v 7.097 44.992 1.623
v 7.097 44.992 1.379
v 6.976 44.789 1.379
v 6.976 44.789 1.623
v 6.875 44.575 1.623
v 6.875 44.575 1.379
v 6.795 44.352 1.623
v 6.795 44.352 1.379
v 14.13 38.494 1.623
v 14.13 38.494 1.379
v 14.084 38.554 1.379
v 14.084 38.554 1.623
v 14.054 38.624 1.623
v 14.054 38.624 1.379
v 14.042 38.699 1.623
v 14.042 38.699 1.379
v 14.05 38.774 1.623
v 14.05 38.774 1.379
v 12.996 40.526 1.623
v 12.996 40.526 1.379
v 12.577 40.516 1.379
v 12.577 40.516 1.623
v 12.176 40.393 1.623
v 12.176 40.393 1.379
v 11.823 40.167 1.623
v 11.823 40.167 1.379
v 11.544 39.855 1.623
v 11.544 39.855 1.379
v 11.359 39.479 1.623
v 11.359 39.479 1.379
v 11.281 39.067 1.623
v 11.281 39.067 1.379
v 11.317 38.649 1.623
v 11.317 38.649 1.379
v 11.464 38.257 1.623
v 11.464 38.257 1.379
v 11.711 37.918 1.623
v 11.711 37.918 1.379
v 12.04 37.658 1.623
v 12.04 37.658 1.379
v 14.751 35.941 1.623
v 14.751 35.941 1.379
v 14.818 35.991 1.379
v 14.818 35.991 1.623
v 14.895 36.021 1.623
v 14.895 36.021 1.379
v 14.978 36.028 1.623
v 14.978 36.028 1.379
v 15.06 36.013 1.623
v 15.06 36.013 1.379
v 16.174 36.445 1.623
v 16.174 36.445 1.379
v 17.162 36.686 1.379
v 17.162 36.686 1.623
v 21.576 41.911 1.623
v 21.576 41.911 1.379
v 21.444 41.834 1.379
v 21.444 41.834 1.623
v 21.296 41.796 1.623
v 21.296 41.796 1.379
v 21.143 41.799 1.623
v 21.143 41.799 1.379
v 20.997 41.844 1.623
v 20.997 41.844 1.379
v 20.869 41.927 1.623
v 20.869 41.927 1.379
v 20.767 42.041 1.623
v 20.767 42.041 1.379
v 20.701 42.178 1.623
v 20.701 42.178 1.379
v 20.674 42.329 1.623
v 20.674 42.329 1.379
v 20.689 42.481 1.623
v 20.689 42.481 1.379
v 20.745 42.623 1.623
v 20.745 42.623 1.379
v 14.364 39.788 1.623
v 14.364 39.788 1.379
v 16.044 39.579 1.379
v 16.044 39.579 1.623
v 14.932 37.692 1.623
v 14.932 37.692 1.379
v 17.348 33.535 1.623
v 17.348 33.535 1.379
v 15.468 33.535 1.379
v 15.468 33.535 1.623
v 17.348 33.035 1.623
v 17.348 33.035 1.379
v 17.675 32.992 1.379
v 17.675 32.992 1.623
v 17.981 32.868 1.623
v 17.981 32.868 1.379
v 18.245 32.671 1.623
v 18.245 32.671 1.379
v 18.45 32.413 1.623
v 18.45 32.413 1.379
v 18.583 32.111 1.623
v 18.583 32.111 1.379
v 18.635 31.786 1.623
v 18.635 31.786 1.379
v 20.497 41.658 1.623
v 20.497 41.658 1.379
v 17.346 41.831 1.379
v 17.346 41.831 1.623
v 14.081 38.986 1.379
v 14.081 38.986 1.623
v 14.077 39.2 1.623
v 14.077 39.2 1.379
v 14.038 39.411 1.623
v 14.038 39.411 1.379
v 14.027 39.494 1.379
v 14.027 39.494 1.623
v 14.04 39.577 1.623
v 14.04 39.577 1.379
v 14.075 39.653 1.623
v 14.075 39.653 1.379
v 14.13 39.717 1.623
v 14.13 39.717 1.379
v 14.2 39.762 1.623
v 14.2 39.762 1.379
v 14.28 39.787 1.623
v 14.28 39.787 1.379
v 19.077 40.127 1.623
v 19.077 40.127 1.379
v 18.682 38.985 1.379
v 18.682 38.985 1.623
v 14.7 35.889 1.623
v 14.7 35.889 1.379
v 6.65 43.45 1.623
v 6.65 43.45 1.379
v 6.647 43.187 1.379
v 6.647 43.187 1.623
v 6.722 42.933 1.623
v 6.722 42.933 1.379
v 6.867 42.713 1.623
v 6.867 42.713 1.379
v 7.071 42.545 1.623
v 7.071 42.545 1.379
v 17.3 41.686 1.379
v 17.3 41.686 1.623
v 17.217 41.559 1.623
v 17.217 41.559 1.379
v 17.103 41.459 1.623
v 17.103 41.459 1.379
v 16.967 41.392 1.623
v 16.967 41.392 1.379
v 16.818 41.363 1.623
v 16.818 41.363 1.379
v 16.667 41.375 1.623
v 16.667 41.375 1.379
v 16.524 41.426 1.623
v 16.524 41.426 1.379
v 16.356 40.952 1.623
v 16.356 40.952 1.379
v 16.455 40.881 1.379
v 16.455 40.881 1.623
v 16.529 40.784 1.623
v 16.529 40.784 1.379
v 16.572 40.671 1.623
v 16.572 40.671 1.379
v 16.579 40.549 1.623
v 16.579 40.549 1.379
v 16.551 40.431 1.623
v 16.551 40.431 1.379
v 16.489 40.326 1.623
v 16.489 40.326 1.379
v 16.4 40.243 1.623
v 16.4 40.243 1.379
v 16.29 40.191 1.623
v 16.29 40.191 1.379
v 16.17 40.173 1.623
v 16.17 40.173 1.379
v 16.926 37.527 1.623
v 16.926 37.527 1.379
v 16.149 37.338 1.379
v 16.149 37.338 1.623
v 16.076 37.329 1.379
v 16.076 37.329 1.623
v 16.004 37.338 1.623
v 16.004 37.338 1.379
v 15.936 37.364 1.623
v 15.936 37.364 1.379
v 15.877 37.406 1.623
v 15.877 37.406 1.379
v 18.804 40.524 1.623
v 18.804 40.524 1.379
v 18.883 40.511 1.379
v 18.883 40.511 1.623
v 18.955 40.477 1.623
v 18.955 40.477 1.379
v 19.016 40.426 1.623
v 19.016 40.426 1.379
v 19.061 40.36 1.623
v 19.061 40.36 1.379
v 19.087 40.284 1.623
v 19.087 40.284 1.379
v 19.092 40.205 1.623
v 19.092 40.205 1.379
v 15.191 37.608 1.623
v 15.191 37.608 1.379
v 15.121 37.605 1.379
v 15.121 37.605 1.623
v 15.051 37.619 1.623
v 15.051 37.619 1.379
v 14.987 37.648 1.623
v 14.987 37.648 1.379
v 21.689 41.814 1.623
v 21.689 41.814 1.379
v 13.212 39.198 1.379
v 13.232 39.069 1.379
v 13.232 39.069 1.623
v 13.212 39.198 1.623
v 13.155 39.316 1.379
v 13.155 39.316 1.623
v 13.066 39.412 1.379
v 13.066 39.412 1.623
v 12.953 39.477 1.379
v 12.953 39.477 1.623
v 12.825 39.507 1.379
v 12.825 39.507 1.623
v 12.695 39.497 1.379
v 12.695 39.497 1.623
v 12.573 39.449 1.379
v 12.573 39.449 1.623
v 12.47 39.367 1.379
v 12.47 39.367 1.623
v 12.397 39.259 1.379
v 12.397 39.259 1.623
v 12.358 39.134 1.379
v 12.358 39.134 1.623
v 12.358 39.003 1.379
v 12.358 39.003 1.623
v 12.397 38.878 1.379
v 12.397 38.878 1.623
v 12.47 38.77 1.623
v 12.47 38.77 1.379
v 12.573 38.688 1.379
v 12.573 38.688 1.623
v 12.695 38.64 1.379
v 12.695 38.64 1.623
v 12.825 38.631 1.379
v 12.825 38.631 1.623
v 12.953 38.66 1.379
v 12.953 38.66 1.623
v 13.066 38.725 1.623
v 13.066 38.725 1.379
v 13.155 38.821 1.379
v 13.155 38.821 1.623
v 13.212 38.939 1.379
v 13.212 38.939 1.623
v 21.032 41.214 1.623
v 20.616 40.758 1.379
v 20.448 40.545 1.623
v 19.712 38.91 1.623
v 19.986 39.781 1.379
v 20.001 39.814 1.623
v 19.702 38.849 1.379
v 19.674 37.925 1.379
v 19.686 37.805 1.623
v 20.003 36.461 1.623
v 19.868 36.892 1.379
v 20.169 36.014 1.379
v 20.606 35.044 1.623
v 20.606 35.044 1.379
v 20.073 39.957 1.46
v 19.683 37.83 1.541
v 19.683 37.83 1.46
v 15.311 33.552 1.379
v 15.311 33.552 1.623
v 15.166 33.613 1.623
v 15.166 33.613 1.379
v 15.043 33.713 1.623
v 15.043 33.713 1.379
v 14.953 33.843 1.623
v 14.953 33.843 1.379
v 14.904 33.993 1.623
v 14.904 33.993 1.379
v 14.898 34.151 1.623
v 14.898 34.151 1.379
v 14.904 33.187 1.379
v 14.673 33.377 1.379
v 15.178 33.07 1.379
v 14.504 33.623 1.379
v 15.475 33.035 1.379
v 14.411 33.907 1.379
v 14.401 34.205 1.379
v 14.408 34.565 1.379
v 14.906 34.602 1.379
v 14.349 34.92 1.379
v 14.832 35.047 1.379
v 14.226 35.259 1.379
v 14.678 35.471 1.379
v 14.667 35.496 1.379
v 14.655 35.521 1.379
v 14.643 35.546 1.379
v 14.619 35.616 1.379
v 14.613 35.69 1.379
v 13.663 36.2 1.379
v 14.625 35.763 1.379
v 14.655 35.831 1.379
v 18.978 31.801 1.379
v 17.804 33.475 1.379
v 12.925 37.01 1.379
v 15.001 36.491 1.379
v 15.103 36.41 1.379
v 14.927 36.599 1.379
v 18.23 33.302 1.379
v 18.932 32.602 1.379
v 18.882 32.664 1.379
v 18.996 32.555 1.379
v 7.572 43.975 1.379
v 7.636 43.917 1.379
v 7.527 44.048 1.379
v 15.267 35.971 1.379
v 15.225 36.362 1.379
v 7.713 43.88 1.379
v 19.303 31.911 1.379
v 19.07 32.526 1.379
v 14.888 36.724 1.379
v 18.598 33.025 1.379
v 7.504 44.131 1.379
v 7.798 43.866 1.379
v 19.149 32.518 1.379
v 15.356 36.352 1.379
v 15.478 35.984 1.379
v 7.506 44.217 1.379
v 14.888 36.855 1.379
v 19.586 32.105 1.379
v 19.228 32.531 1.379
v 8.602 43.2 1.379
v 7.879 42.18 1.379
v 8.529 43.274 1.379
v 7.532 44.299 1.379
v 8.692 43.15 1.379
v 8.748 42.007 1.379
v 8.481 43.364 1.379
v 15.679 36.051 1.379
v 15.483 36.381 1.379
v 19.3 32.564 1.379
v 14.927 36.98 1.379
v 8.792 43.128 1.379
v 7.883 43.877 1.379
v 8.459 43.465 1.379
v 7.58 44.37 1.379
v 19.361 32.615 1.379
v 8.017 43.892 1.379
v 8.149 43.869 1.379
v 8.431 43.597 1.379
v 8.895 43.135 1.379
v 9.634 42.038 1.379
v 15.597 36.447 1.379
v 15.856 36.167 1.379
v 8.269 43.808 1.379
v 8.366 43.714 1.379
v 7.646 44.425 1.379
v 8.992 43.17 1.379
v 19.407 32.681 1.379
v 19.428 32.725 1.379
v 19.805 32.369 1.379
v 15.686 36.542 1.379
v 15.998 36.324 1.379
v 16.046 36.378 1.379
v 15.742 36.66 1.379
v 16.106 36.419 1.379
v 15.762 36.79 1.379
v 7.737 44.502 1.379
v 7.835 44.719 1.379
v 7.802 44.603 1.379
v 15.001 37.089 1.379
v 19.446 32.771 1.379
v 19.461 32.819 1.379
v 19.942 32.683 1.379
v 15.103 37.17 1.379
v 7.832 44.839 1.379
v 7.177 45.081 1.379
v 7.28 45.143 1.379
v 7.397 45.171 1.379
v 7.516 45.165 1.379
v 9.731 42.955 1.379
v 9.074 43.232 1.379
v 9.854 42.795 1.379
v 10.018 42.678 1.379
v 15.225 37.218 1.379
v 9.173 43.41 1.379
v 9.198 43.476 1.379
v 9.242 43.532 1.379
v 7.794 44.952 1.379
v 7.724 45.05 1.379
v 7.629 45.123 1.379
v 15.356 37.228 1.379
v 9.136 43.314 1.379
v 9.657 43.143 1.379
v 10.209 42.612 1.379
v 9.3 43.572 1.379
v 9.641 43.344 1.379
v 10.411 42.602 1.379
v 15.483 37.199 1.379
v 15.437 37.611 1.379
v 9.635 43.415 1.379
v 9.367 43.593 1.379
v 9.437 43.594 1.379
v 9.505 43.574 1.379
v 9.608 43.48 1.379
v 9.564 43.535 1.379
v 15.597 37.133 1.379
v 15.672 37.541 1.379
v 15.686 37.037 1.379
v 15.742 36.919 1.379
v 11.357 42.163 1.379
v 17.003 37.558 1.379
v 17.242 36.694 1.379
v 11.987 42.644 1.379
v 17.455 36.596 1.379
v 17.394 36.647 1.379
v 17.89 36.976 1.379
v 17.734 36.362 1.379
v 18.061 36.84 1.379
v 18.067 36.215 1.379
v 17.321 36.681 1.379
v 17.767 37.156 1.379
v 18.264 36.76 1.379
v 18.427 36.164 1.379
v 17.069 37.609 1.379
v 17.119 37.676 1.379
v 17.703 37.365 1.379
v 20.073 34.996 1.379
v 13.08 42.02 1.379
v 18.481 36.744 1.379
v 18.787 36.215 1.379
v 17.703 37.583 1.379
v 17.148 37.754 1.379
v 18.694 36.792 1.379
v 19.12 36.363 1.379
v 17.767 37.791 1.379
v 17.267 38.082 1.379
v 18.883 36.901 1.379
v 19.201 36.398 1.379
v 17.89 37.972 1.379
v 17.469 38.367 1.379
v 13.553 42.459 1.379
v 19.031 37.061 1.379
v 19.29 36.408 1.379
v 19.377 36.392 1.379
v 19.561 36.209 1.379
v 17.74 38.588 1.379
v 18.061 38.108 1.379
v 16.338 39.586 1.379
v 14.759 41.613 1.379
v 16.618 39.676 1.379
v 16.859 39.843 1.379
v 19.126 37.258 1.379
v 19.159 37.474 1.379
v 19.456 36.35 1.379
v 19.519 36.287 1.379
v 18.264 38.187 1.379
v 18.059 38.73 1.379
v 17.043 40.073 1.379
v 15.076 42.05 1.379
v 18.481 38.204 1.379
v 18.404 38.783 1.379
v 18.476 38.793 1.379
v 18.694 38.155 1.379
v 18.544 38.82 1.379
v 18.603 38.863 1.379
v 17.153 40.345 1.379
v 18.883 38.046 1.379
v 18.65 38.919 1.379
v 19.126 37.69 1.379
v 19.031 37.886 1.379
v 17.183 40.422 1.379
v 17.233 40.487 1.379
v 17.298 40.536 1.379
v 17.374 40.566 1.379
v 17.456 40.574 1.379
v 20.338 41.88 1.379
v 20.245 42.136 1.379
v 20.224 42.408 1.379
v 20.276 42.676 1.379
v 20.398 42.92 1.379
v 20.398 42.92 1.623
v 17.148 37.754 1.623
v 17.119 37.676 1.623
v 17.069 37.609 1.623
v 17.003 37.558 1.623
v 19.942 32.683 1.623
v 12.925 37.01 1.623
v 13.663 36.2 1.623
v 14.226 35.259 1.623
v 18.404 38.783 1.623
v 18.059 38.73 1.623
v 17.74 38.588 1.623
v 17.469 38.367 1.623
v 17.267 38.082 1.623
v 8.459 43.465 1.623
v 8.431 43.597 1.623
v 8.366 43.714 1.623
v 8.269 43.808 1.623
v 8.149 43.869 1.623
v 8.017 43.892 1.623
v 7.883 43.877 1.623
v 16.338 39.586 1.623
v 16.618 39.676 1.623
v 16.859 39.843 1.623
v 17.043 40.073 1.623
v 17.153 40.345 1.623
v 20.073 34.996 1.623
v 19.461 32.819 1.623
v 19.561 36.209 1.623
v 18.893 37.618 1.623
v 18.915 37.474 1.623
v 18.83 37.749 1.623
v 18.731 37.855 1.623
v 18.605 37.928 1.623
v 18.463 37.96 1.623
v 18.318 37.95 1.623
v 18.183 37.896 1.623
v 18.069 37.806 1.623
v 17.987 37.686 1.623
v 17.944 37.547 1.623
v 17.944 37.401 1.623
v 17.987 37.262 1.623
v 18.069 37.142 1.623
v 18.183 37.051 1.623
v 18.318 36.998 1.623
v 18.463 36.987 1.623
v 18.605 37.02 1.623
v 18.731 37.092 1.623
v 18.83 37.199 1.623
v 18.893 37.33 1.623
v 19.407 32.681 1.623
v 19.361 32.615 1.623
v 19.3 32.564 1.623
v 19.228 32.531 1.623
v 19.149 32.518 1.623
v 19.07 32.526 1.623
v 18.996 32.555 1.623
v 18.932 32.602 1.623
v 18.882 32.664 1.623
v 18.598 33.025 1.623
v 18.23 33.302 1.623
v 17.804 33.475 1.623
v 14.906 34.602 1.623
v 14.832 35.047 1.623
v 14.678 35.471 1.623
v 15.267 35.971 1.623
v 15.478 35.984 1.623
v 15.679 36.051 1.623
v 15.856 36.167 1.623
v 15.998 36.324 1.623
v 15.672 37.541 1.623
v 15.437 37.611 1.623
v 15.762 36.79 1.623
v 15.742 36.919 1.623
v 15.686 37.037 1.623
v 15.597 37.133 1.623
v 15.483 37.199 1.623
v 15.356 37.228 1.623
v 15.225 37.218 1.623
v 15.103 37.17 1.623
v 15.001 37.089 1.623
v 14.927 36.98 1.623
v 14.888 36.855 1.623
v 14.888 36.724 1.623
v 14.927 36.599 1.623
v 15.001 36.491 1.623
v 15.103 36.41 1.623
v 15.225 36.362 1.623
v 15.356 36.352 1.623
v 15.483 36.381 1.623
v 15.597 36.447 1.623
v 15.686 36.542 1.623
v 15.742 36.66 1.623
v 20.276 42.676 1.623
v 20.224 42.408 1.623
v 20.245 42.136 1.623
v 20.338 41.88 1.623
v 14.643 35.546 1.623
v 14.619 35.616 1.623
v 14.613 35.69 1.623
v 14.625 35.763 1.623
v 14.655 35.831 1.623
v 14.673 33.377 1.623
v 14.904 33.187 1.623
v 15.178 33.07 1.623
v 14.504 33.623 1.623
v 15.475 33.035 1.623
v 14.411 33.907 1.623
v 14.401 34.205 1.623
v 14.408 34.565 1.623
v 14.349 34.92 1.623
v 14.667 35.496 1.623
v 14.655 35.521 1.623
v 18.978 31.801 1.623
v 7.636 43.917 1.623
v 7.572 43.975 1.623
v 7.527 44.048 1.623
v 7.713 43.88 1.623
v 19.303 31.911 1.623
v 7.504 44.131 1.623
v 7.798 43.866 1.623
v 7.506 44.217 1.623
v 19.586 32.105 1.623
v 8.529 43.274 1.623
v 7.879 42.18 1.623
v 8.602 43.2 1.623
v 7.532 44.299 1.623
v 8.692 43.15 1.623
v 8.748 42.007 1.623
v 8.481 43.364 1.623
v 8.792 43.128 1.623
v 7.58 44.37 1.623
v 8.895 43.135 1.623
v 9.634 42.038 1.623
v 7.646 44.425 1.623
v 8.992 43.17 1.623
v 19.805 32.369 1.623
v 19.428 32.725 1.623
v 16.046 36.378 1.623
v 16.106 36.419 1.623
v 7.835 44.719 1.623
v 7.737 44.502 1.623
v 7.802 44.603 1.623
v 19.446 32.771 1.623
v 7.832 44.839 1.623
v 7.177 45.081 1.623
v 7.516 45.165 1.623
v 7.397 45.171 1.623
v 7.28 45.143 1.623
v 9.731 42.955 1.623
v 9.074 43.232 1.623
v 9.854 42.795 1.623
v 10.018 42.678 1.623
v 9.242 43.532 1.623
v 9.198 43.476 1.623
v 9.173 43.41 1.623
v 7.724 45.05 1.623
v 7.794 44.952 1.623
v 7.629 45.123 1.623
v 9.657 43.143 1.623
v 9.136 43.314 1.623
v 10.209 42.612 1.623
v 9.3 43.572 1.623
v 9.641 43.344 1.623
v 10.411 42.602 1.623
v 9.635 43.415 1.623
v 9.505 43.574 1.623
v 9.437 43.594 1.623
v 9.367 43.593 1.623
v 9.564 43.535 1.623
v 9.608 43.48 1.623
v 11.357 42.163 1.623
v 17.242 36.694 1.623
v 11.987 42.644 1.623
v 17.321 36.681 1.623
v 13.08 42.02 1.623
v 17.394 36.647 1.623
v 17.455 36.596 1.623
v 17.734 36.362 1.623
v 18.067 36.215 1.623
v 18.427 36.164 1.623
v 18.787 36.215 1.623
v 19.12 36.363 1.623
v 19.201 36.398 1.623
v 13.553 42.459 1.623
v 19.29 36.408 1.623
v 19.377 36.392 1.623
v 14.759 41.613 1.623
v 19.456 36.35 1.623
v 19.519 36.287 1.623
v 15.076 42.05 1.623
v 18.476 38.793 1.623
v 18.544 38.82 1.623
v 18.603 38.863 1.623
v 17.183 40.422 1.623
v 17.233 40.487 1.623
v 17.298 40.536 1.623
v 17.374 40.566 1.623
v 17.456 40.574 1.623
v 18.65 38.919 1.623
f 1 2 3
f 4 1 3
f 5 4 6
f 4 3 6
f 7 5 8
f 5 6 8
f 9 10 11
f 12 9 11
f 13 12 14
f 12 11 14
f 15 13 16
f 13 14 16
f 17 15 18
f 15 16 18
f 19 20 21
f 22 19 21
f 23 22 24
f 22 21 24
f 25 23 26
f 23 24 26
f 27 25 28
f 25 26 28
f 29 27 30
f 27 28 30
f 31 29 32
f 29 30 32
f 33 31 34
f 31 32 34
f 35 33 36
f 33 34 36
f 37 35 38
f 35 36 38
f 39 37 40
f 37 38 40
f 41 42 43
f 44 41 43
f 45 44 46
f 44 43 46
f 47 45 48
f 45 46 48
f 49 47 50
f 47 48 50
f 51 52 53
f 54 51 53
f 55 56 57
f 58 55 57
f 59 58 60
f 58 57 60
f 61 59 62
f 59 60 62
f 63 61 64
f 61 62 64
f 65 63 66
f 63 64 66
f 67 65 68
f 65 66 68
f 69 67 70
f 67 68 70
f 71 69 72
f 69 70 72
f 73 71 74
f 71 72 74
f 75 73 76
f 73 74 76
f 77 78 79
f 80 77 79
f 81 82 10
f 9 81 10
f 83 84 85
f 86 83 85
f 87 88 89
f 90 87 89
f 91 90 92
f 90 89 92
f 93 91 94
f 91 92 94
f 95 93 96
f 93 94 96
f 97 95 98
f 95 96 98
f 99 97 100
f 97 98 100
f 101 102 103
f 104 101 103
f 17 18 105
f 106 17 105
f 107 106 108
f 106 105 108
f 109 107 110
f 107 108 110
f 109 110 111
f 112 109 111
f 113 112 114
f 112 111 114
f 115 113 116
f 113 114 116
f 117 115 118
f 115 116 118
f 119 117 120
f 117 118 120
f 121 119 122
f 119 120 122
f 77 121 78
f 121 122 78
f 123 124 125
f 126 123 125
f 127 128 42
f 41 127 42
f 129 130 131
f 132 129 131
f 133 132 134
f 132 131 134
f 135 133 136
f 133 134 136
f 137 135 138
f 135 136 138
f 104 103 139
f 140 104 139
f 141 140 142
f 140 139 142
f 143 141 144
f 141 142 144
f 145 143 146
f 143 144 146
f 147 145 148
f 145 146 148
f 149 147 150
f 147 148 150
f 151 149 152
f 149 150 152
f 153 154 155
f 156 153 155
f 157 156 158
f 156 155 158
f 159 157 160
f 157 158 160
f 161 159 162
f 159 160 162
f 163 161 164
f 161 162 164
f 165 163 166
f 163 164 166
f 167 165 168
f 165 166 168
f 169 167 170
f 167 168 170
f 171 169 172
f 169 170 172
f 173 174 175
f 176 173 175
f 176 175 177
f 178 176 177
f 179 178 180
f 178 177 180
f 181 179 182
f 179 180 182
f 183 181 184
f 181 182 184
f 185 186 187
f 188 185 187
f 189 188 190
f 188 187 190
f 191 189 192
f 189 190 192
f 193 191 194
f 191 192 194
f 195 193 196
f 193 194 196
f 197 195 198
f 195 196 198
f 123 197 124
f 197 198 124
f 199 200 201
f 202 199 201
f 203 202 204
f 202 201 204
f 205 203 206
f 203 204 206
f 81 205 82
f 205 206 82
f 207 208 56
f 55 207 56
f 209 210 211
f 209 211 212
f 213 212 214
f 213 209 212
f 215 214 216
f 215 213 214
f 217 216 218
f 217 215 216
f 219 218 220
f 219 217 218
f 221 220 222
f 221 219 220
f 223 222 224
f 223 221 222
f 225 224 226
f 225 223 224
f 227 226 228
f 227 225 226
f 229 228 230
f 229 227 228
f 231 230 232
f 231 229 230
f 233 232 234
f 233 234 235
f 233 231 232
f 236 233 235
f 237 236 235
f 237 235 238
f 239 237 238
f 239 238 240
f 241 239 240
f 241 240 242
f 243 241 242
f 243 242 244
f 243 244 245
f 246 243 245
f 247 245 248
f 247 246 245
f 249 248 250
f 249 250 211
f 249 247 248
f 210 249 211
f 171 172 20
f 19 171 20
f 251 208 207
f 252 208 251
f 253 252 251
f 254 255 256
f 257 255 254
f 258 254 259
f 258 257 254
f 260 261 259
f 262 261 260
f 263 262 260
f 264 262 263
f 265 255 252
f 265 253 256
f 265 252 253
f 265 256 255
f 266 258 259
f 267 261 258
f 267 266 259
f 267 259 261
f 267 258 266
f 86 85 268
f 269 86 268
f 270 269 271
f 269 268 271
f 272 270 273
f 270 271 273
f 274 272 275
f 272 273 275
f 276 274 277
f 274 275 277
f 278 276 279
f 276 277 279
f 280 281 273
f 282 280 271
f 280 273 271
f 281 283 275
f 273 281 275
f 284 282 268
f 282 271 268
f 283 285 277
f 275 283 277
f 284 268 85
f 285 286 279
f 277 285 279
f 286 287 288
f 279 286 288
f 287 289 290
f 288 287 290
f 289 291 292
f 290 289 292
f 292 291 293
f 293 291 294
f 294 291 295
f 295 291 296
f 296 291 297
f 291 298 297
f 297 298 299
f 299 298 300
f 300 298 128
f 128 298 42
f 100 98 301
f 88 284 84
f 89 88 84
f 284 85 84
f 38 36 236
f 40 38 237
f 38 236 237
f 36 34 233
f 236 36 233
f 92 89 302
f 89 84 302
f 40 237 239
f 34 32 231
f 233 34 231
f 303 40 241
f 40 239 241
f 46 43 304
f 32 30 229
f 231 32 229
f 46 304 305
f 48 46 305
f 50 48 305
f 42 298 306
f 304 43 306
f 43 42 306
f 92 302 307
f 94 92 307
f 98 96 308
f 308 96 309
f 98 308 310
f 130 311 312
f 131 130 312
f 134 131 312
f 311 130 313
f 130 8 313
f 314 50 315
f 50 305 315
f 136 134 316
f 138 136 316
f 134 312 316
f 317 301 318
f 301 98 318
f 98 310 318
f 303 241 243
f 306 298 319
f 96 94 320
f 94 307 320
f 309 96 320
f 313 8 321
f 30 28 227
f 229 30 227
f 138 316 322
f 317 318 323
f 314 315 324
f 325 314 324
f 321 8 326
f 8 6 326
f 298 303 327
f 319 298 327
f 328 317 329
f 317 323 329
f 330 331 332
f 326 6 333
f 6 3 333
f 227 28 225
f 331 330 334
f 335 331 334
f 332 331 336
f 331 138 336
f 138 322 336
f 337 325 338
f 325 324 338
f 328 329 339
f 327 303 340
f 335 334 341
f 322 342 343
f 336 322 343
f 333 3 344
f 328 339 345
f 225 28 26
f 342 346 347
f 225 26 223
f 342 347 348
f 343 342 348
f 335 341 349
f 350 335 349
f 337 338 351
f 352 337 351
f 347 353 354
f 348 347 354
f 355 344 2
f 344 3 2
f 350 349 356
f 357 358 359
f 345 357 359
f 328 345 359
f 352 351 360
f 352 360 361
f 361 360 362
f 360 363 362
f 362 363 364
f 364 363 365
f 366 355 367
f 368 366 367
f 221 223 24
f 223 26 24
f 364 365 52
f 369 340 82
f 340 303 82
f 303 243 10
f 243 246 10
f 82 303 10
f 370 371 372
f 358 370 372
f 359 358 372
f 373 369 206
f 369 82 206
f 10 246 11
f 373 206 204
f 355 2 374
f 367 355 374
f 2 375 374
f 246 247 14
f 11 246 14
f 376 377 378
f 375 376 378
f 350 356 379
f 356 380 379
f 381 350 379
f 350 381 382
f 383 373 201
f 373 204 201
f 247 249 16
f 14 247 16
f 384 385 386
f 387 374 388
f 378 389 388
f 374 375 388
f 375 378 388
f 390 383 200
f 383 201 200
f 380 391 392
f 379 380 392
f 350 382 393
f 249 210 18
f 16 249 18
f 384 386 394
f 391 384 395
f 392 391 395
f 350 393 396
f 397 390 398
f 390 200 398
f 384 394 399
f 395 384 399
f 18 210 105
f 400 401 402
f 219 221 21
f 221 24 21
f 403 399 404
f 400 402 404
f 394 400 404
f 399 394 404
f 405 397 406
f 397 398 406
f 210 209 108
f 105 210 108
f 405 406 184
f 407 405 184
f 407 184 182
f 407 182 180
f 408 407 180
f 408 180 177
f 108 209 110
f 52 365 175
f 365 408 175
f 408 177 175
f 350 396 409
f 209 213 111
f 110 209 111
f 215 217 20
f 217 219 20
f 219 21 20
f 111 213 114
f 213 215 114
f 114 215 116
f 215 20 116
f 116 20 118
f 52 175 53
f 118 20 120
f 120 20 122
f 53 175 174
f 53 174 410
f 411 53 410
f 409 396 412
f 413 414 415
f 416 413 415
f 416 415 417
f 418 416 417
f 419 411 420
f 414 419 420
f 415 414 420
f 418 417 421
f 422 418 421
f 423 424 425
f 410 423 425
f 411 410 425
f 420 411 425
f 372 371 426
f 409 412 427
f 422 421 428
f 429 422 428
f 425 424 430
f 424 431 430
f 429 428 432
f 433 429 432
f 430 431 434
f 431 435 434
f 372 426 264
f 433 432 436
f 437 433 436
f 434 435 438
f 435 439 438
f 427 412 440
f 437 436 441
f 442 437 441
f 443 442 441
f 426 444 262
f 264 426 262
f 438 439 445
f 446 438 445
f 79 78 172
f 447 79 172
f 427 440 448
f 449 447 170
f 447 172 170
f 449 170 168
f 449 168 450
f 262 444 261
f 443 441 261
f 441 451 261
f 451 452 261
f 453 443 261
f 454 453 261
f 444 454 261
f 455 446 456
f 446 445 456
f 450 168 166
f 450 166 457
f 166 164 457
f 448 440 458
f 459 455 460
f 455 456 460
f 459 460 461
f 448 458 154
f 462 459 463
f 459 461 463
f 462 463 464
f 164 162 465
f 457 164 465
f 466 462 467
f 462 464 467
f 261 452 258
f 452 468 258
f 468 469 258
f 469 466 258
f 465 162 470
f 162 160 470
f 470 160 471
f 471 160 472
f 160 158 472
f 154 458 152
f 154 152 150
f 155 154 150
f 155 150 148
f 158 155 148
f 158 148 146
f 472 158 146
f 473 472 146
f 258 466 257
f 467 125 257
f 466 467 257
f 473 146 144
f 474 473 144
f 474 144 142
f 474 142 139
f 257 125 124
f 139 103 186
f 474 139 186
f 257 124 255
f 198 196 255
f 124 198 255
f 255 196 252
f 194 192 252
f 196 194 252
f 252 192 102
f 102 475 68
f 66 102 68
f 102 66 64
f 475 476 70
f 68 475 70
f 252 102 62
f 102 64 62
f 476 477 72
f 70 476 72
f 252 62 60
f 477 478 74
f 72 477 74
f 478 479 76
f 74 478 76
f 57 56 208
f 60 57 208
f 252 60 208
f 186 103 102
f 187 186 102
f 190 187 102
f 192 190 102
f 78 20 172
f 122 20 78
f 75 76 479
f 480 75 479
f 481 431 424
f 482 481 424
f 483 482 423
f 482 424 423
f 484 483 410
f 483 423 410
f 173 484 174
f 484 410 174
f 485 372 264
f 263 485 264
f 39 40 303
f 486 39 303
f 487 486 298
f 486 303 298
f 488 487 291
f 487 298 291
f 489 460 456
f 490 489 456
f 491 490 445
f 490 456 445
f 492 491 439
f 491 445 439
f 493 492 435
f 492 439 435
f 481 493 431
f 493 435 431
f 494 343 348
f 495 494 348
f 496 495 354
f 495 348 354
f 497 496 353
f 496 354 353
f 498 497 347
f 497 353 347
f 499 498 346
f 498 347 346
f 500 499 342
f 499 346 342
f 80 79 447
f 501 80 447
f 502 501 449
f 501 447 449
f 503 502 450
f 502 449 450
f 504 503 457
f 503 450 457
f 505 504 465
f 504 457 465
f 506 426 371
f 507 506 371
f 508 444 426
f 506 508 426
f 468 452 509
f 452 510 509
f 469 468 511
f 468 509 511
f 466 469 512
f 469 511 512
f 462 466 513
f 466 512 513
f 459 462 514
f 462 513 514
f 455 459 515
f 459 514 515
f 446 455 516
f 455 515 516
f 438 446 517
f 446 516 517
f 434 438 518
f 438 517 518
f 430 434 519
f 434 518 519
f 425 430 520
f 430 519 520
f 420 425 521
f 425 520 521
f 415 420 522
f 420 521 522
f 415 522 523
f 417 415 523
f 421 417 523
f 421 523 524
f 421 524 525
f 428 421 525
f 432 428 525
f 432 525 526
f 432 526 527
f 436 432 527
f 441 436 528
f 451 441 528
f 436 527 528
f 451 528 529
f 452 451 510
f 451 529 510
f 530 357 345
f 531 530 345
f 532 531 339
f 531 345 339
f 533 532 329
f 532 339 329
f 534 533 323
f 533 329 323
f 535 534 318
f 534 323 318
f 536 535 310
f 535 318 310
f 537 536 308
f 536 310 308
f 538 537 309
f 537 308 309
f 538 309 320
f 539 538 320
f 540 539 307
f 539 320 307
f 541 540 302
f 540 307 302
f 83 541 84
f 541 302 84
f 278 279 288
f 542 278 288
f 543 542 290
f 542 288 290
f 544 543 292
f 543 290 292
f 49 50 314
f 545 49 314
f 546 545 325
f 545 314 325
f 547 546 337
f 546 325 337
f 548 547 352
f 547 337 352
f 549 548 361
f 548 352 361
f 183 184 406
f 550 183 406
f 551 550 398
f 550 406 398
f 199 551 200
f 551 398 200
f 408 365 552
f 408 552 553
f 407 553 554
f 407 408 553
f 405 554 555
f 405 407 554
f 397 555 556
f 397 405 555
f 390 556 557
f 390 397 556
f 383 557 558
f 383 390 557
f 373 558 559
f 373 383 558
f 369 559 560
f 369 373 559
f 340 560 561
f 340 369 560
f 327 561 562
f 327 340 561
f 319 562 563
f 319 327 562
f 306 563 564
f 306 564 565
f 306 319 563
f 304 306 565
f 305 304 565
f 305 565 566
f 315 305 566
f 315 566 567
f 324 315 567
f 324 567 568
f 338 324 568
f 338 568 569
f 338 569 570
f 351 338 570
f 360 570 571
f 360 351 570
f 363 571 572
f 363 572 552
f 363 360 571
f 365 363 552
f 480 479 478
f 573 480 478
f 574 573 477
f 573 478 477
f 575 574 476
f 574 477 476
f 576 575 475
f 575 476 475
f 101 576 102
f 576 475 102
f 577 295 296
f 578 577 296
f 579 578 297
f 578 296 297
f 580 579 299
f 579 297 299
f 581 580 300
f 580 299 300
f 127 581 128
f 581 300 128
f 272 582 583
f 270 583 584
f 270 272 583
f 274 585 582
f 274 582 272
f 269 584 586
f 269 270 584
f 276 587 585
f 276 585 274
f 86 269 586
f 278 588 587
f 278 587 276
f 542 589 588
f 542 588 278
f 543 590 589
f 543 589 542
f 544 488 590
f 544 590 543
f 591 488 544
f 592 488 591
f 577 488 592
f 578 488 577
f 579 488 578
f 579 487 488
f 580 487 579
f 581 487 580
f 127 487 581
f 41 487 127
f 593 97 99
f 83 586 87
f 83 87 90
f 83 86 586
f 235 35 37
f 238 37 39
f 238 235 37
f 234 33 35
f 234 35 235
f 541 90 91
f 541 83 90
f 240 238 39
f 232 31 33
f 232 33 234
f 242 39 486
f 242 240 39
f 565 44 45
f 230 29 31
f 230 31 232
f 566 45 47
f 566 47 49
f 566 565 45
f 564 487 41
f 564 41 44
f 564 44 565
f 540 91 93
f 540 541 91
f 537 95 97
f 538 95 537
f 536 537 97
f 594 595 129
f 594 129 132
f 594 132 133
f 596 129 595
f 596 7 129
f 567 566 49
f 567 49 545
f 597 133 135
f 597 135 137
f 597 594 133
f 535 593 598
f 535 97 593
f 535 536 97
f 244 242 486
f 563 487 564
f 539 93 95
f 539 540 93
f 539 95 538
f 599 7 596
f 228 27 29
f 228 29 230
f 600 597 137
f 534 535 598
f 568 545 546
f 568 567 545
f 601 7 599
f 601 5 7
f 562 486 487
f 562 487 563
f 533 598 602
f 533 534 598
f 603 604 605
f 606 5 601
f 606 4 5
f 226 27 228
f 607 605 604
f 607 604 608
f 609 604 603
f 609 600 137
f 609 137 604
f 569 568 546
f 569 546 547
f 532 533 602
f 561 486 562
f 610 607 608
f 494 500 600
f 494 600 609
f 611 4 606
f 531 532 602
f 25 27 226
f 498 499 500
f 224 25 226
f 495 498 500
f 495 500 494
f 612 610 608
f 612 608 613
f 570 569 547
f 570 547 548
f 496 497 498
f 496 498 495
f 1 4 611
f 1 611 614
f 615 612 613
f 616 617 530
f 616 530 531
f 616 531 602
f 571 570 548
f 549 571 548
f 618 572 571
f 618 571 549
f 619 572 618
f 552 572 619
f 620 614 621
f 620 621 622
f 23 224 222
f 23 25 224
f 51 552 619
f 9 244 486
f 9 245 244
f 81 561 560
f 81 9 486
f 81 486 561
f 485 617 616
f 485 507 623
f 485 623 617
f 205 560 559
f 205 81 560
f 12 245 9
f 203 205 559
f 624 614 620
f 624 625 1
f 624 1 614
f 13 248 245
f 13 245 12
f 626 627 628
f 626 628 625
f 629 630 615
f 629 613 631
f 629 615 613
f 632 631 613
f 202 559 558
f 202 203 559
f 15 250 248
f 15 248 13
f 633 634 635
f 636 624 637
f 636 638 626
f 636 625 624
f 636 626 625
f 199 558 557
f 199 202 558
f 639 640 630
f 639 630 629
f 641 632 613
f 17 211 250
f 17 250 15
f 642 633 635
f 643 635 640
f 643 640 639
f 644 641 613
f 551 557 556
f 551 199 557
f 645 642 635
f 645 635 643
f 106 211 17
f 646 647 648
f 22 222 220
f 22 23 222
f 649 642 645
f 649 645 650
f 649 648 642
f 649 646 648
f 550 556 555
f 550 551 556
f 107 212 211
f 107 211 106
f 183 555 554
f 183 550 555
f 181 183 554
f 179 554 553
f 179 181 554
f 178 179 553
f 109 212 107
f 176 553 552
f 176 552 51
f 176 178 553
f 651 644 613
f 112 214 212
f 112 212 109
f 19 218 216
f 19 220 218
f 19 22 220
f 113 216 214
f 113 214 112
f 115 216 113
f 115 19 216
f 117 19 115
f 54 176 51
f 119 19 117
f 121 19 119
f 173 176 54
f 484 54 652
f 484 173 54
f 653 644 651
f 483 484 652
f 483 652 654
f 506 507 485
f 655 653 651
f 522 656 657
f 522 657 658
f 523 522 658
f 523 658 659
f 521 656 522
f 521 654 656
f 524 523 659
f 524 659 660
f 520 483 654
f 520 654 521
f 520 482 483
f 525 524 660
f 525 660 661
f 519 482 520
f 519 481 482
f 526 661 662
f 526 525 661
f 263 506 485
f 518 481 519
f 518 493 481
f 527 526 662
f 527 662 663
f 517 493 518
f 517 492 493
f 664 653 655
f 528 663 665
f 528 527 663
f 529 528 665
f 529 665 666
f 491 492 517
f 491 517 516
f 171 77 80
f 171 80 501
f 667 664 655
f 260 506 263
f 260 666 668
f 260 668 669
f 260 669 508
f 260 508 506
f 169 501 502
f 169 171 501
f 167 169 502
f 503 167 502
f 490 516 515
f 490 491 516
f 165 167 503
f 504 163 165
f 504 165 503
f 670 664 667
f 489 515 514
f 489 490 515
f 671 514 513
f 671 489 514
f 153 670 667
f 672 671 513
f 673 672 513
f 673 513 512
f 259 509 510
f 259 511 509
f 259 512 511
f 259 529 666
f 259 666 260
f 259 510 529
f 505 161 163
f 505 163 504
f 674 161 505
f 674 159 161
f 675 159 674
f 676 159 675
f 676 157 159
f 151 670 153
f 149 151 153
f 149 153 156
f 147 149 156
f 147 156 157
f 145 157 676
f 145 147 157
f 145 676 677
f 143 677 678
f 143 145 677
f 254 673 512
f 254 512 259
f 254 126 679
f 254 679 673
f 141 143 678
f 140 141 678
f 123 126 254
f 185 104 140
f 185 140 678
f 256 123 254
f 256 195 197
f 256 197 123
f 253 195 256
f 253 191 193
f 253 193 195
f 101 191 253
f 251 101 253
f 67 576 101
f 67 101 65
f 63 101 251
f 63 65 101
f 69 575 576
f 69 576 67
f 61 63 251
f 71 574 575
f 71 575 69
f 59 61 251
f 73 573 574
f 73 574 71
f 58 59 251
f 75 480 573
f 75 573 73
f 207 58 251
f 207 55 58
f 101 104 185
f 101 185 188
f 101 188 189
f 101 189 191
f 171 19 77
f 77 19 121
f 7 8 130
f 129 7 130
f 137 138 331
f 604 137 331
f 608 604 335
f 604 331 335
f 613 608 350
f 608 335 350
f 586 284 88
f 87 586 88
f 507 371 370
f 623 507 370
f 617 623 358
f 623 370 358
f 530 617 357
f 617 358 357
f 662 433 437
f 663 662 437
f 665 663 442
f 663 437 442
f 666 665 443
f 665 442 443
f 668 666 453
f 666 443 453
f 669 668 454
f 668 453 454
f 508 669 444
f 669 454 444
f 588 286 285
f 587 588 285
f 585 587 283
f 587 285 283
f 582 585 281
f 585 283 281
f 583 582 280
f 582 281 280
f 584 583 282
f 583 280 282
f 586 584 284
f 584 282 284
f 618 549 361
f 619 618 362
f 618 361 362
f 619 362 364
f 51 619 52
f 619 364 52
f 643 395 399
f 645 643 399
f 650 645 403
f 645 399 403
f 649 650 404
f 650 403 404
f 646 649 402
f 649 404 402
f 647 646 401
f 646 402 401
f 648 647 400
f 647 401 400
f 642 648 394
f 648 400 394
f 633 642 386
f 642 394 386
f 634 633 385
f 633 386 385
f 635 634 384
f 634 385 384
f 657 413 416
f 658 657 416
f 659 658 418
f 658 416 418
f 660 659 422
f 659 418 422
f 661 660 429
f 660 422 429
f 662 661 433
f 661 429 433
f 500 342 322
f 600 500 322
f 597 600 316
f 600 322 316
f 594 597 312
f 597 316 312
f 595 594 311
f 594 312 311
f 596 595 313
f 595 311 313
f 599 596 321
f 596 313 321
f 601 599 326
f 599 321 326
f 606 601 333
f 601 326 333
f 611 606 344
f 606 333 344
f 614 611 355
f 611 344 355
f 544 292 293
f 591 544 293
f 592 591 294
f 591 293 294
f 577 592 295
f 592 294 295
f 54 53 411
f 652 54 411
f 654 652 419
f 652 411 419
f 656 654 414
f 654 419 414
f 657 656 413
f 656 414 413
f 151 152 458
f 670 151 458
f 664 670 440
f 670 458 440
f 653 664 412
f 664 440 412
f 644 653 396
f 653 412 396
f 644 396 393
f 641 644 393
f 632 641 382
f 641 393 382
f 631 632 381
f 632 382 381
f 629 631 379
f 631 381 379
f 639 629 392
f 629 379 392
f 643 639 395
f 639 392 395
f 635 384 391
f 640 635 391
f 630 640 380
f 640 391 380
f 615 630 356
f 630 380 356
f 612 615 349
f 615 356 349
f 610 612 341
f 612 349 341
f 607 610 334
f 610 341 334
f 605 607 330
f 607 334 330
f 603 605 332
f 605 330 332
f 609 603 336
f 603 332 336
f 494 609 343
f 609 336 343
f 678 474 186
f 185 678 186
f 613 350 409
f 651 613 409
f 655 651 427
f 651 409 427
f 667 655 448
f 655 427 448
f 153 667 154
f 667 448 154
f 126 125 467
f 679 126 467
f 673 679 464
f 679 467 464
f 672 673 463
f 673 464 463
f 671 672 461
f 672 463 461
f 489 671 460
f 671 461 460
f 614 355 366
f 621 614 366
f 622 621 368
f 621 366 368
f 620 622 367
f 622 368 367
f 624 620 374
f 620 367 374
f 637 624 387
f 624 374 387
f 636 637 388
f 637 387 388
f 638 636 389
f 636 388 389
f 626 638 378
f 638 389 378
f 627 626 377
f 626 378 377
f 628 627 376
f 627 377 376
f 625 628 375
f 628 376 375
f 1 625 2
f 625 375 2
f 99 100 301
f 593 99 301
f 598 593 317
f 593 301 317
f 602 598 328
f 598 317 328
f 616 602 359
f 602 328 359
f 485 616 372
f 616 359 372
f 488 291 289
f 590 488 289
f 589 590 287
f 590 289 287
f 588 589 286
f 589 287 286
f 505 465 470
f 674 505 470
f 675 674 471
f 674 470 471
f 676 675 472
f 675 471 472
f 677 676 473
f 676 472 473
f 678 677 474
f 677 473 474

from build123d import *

# Parameters (mm, degrees)
SCALE1_START       = 1.378692074
SCALE1_OUTLINE_R   = 0.4392
SCALE1_DEPTH       = 0.244
CUT_EXTRUDE1_DEPTH = 2.54
CUT_EXTRUDE2_DEPTH = 51.110559093
CUT_EXTRUDE3_DEPTH = 51.110559093
CUT_EXTRUDE4_DEPTH = 51.110559093


with BuildPart() as part:
    # Scale1: read off the stored shape, not the designer's step
    # Scale1 outline → Scale1 (new body)
    with BuildSketch(Plane.XY.offset(SCALE1_START)):
        with BuildLine():
            Line((17.68301566, 43.704577473), (17.346177673, 41.830755017))
            ThreePointArc((17.346177673, 41.830755017), (17.037161165, 41.420736581), (16.523766226, 41.426389643))
            ThreePointArc((16.523766226, 41.426389643), (13.552700425, 42.459086685), (10.410542545, 42.602401154))
            ThreePointArc((10.410542545, 42.602401154), (9.854263516, 42.795493333), (9.640942513, 43.344333108))
            ThreePointArc((9.640942513, 43.344333108), (9.437328912, 43.59391361), (9.172716599, 43.410258363))
            ThreePointArc((9.172716599, 43.410258363), (8.792265037, 43.128007225), (8.459444481, 43.465111917))
            ThreePointArc((8.459444481, 43.465111917), (8.269075619, 43.807602921), (7.883340454, 43.876514268))
            ThreePointArc((7.883340454, 43.876514268), (7.526718951, 44.047734987), (7.645582772, 44.425050271))
            ThreePointArc((7.645582772, 44.425050271), (7.724200076, 45.050111764), (7.096911805, 44.991871103))
            ThreePointArc((7.096911805, 44.991871103), (6.923054486, 44.682724324), (6.79514349, 44.351911876))
            Line((6.79514349, 44.351911876), (6.650098626, 43.450480425))
            ThreePointArc((6.650098626, 43.450480425), (6.721898103, 42.933324679), (7.071222107, 42.545280904))
            ThreePointArc((7.071222107, 42.545280904), (8.30836308, 42.068484056), (9.633857836, 42.038207468))
            ThreePointArc((9.633857836, 42.038207468), (13.079663737, 42.019930147), (16.355693709, 40.951501394))
            ThreePointArc((16.355693709, 40.951501394), (16.569606698, 40.488798349), (16.169670974, 40.172721944))
            Line((16.169670974, 40.172721944), (12.996206362, 40.526319917))
            ThreePointArc((12.996206362, 40.526319917), (11.358592721, 39.478912268), (12.040129402, 37.658376915))
            ThreePointArc((12.040129402, 37.658376915), (13.31395276, 36.623381651), (14.225764982, 35.258669367))
            ThreePointArc((14.225764982, 35.258669367), (14.386229966, 34.744015637), (14.401396414, 34.205139535))
            ThreePointArc((14.401396414, 34.205139535), (14.672806749, 33.376647317), (15.474699865, 33.034550319))
            Line((15.474699865, 33.034550319), (17.348101609, 33.034550317))
            ThreePointArc((17.348101609, 33.034550317), (18.244587572, 32.671085647), (18.634843629, 31.785933762))
            ThreePointArc((18.634843629, 31.785933762), (19.451177789, 31.997778319), (19.942322167, 32.683385187))
            Line((19.942322167, 32.683385187), (21.269314636, 37.404760613))
            ThreePointArc((21.269314636, 37.404760613), (21.73439895, 38.387008616), (22.497682404, 39.16064479))
            Line((22.497682404, 39.16064479), (23.128103851, 39.765569271))
            ThreePointArc((23.128103851, 39.765569271), (23.52490002, 40.486669007), (23.253920075, 41.263844598))
            Line((23.253920075, 41.263844598), (22.452558823, 42.115876451))
            ThreePointArc((22.452558823, 42.115876451), (22.115289154, 42.23834678), (21.816559174, 42.039575025))
            Line((21.816559174, 42.039575025), (21.688661164, 41.814089241))
            Line((21.688661164, 41.814089241), (21.575749212, 41.910847183))
            ThreePointArc((21.575749212, 41.910847183), (20.868513286, 41.926668482), (20.744543825, 42.623134233))
            Line((20.744543825, 42.623134233), (18.940412338, 44.169153428))
            ThreePointArc((18.940412338, 44.169153428), (18.175234277, 44.306254238), (17.68301566, 43.704577473))
        make_face()
        with Locations((15.322718522, 36.789890957)):
            Circle(SCALE1_OUTLINE_R, mode=Mode.SUBTRACT)
        with Locations((12.792357561, 39.068616569)):
            Circle(SCALE1_OUTLINE_R, mode=Mode.SUBTRACT)
    extrude(amount=SCALE1_DEPTH)

    # Scale1 2 outline → Scale1 2 (revolve, cut)
    with BuildSketch(Plane(origin=(18.426504279, 37.473794578, 0), x_dir=(1, 0, 0), z_dir=(0, -1, 0))):
        Polygon((0, 1.378692074), (0.732, 1.378692074), (0.488, 1.622692074), (0, 1.622692074), align=None)
    revolve(axis=Axis((18.426504279, 37.473794578, 0), (0, 0, 1)), mode=Mode.SUBTRACT)

    # Sketch1 → Cut-Extrude1 (cut)
    with BuildSketch(Plane(origin=(0, 0, 1.378692074), x_dir=(-1, 0, 0), z_dir=(0, 0, -1))):
        with BuildLine():
            Line((-21.688661166, 41.81408924), (-21.982980789, 42.999564373))
            Line((-21.982980789, 42.999564373), (-25.421126936, 39.405059446))
            Line((-25.421126936, 39.405059446), (-20.605818398, 35.044072901))
            add(Edge.make_bspline(
                [(-21.688661166, 41.81408924), (-19.489266143, 39.961862231), (-18.997440369, 38.289314262), (-20.605818398, 35.044072901)],
                knots=[0, 0, 0, 0, 1, 1, 1, 1], degree=3))
        make_face()
    extrude(amount=-CUT_EXTRUDE1_DEPTH, mode=Mode.SUBTRACT)

    # Sketch2 → Cut-Extrude2 (cut, through all)
    with BuildSketch(Plane(origin=(0, 0, 1.378692074), x_dir=(-1, 0, 0), z_dir=(0, 0, -1))):
        with BuildLine():
            Line((-17.348101609, 33.534550318), (-15.46825055, 33.534550318))
            ThreePointArc((-15.46825055, 33.534550318), (-15.042927497, 33.712833322), (-14.89843377, 34.150790045))
            ThreePointArc((-14.89843377, 34.150790045), (-14.879423654, 34.826234772), (-14.678291655, 35.471318396))
            ThreePointArc((-14.678291655, 35.471318396), (-14.660582055, 35.508670476), (-14.642615597, 35.545899689))
            ThreePointArc((-14.642615597, 35.545899689), (-14.616480362, 35.726837837), (-14.700216201, 35.889349293))
            Line((-14.700216201, 35.889349293), (-14.751462797, 35.940595889))
            ThreePointArc((-14.751462797, 35.940595889), (-14.895326012, 36.020592881), (-15.059742801, 36.012639096))
            ThreePointArc((-15.059742801, 36.012639096), (-15.580994431, 36.011064763), (-15.998016925, 36.323791449))
            ThreePointArc((-15.998016925, 36.323791449), (-16.074795707, 36.400479379), (-16.173833875, 36.44483545))
            Line((-16.173833875, 36.44483545), (-17.161803556, 36.685788167))
            ThreePointArc((-17.161803556, 36.685788167), (-17.321020312, 36.681092865), (-17.455391032, 36.595556142))
            ThreePointArc((-17.455391032, 36.595556142), (-18.245306435, 36.177055965), (-19.119682785, 36.362998806))
            ThreePointArc((-19.119682785, 36.362998806), (-19.377471249, 36.391695847), (-19.561279678, 36.208685263))
            Line((-19.561279678, 36.208685263), (-20.072904791, 34.995897621))
            Line((-20.072904791, 34.995897621), (-19.460972938, 32.818673477))
            ThreePointArc((-19.460972938, 32.818673477), (-19.437288786, 32.748237282), (-19.40663946, 32.680540786))
            ThreePointArc((-19.40663946, 32.680540786), (-19.149382906, 32.518029269), (-18.882393628, 32.66400068))
            ThreePointArc((-18.882393628, 32.66400068), (-18.230131749, 33.301751954), (-17.348101609, 33.534550318))
        make_face()
    extrude(amount=-CUT_EXTRUDE2_DEPTH, mode=Mode.SUBTRACT)

    # Sketch3 → Cut-Extrude3 (cut, through all)
    with BuildSketch(Plane(origin=(0, 0, 1.378692074), x_dir=(-1, 0, 0), z_dir=(0, 0, -1))):
        with BuildLine():
            Line((-20.496817758, 41.658030449), (-17.346177676, 41.830755017))
            Line((-17.346177676, 41.830755017), (-17.346177676, 45.415633963))
            Line((-17.346177676, 45.415633963), (-20.923893138, 43.312384261))
            ThreePointArc((-20.923893138, 43.312384261), (-20.253979171, 42.603021979), (-20.496817758, 41.658030449))
        make_face()
    extrude(amount=-CUT_EXTRUDE3_DEPTH, mode=Mode.SUBTRACT)

    # Sketch4 → Cut-Extrude4 (cut, through all)
    with BuildSketch(Plane(origin=(0, 0, 1.378692074), x_dir=(-1, 0, 0), z_dir=(0, 0, -1))):
        with BuildLine():
            Line((-17.455852383, 40.574313146), (-18.8042073, 40.524397539))
            ThreePointArc((-18.8042073, 40.524397539), (-19.040601602, 40.394153532), (-19.076676041, 40.126675679))
            Line((-19.076676041, 40.126675679), (-18.682397479, 38.984966524))
            ThreePointArc((-18.682397479, 38.984966524), (-18.575024983, 38.840086232), (-18.403989188, 38.782938099))
            ThreePointArc((-18.403989188, 38.782938099), (-17.597035683, 38.48688171), (-17.14755053, 37.754224599))
            ThreePointArc((-17.14755053, 37.754224599), (-17.069108072, 37.608838613), (-16.925594615, 37.527020573))
            Line((-16.925594615, 37.527020573), (-16.148609211, 37.337524127))
            ThreePointArc((-16.148609211, 37.337524127), (-16.00427201, 37.33806247), (-15.876892057, 37.405943726))
            ThreePointArc((-15.876892057, 37.405943726), (-15.557022892, 37.584705893), (-15.191334883, 37.60803988))
            ThreePointArc((-15.191334883, 37.60803988), (-15.051369663, 37.618828593), (-14.931636329, 37.692112887))
            Line((-14.931636329, 37.692112887), (-14.130011628, 38.493737588))
            ThreePointArc((-14.130011628, 38.493737588), (-14.053640182, 38.623615493), (-14.050038507, 38.774240511))
            ThreePointArc((-14.050038507, 38.774240511), (-14.083791972, 39.093431642), (-14.037801355, 39.411090481))
            ThreePointArc((-14.037801355, 39.411090481), (-14.100156714, 39.686879536), (-14.364076124, 39.788340557))
            Line((-14.364076124, 39.788340557), (-16.044195491, 39.579464149))
            ThreePointArc((-16.044195491, 39.579464149), (-16.744622059, 39.75112655), (-17.15323559, 40.345349015))
            ThreePointArc((-17.15323559, 40.345349015), (-17.263742997, 40.513756841), (-17.455852383, 40.574313146))
        make_face()
    extrude(amount=-CUT_EXTRUDE4_DEPTH, mode=Mode.SUBTRACT)


solid = part.part
